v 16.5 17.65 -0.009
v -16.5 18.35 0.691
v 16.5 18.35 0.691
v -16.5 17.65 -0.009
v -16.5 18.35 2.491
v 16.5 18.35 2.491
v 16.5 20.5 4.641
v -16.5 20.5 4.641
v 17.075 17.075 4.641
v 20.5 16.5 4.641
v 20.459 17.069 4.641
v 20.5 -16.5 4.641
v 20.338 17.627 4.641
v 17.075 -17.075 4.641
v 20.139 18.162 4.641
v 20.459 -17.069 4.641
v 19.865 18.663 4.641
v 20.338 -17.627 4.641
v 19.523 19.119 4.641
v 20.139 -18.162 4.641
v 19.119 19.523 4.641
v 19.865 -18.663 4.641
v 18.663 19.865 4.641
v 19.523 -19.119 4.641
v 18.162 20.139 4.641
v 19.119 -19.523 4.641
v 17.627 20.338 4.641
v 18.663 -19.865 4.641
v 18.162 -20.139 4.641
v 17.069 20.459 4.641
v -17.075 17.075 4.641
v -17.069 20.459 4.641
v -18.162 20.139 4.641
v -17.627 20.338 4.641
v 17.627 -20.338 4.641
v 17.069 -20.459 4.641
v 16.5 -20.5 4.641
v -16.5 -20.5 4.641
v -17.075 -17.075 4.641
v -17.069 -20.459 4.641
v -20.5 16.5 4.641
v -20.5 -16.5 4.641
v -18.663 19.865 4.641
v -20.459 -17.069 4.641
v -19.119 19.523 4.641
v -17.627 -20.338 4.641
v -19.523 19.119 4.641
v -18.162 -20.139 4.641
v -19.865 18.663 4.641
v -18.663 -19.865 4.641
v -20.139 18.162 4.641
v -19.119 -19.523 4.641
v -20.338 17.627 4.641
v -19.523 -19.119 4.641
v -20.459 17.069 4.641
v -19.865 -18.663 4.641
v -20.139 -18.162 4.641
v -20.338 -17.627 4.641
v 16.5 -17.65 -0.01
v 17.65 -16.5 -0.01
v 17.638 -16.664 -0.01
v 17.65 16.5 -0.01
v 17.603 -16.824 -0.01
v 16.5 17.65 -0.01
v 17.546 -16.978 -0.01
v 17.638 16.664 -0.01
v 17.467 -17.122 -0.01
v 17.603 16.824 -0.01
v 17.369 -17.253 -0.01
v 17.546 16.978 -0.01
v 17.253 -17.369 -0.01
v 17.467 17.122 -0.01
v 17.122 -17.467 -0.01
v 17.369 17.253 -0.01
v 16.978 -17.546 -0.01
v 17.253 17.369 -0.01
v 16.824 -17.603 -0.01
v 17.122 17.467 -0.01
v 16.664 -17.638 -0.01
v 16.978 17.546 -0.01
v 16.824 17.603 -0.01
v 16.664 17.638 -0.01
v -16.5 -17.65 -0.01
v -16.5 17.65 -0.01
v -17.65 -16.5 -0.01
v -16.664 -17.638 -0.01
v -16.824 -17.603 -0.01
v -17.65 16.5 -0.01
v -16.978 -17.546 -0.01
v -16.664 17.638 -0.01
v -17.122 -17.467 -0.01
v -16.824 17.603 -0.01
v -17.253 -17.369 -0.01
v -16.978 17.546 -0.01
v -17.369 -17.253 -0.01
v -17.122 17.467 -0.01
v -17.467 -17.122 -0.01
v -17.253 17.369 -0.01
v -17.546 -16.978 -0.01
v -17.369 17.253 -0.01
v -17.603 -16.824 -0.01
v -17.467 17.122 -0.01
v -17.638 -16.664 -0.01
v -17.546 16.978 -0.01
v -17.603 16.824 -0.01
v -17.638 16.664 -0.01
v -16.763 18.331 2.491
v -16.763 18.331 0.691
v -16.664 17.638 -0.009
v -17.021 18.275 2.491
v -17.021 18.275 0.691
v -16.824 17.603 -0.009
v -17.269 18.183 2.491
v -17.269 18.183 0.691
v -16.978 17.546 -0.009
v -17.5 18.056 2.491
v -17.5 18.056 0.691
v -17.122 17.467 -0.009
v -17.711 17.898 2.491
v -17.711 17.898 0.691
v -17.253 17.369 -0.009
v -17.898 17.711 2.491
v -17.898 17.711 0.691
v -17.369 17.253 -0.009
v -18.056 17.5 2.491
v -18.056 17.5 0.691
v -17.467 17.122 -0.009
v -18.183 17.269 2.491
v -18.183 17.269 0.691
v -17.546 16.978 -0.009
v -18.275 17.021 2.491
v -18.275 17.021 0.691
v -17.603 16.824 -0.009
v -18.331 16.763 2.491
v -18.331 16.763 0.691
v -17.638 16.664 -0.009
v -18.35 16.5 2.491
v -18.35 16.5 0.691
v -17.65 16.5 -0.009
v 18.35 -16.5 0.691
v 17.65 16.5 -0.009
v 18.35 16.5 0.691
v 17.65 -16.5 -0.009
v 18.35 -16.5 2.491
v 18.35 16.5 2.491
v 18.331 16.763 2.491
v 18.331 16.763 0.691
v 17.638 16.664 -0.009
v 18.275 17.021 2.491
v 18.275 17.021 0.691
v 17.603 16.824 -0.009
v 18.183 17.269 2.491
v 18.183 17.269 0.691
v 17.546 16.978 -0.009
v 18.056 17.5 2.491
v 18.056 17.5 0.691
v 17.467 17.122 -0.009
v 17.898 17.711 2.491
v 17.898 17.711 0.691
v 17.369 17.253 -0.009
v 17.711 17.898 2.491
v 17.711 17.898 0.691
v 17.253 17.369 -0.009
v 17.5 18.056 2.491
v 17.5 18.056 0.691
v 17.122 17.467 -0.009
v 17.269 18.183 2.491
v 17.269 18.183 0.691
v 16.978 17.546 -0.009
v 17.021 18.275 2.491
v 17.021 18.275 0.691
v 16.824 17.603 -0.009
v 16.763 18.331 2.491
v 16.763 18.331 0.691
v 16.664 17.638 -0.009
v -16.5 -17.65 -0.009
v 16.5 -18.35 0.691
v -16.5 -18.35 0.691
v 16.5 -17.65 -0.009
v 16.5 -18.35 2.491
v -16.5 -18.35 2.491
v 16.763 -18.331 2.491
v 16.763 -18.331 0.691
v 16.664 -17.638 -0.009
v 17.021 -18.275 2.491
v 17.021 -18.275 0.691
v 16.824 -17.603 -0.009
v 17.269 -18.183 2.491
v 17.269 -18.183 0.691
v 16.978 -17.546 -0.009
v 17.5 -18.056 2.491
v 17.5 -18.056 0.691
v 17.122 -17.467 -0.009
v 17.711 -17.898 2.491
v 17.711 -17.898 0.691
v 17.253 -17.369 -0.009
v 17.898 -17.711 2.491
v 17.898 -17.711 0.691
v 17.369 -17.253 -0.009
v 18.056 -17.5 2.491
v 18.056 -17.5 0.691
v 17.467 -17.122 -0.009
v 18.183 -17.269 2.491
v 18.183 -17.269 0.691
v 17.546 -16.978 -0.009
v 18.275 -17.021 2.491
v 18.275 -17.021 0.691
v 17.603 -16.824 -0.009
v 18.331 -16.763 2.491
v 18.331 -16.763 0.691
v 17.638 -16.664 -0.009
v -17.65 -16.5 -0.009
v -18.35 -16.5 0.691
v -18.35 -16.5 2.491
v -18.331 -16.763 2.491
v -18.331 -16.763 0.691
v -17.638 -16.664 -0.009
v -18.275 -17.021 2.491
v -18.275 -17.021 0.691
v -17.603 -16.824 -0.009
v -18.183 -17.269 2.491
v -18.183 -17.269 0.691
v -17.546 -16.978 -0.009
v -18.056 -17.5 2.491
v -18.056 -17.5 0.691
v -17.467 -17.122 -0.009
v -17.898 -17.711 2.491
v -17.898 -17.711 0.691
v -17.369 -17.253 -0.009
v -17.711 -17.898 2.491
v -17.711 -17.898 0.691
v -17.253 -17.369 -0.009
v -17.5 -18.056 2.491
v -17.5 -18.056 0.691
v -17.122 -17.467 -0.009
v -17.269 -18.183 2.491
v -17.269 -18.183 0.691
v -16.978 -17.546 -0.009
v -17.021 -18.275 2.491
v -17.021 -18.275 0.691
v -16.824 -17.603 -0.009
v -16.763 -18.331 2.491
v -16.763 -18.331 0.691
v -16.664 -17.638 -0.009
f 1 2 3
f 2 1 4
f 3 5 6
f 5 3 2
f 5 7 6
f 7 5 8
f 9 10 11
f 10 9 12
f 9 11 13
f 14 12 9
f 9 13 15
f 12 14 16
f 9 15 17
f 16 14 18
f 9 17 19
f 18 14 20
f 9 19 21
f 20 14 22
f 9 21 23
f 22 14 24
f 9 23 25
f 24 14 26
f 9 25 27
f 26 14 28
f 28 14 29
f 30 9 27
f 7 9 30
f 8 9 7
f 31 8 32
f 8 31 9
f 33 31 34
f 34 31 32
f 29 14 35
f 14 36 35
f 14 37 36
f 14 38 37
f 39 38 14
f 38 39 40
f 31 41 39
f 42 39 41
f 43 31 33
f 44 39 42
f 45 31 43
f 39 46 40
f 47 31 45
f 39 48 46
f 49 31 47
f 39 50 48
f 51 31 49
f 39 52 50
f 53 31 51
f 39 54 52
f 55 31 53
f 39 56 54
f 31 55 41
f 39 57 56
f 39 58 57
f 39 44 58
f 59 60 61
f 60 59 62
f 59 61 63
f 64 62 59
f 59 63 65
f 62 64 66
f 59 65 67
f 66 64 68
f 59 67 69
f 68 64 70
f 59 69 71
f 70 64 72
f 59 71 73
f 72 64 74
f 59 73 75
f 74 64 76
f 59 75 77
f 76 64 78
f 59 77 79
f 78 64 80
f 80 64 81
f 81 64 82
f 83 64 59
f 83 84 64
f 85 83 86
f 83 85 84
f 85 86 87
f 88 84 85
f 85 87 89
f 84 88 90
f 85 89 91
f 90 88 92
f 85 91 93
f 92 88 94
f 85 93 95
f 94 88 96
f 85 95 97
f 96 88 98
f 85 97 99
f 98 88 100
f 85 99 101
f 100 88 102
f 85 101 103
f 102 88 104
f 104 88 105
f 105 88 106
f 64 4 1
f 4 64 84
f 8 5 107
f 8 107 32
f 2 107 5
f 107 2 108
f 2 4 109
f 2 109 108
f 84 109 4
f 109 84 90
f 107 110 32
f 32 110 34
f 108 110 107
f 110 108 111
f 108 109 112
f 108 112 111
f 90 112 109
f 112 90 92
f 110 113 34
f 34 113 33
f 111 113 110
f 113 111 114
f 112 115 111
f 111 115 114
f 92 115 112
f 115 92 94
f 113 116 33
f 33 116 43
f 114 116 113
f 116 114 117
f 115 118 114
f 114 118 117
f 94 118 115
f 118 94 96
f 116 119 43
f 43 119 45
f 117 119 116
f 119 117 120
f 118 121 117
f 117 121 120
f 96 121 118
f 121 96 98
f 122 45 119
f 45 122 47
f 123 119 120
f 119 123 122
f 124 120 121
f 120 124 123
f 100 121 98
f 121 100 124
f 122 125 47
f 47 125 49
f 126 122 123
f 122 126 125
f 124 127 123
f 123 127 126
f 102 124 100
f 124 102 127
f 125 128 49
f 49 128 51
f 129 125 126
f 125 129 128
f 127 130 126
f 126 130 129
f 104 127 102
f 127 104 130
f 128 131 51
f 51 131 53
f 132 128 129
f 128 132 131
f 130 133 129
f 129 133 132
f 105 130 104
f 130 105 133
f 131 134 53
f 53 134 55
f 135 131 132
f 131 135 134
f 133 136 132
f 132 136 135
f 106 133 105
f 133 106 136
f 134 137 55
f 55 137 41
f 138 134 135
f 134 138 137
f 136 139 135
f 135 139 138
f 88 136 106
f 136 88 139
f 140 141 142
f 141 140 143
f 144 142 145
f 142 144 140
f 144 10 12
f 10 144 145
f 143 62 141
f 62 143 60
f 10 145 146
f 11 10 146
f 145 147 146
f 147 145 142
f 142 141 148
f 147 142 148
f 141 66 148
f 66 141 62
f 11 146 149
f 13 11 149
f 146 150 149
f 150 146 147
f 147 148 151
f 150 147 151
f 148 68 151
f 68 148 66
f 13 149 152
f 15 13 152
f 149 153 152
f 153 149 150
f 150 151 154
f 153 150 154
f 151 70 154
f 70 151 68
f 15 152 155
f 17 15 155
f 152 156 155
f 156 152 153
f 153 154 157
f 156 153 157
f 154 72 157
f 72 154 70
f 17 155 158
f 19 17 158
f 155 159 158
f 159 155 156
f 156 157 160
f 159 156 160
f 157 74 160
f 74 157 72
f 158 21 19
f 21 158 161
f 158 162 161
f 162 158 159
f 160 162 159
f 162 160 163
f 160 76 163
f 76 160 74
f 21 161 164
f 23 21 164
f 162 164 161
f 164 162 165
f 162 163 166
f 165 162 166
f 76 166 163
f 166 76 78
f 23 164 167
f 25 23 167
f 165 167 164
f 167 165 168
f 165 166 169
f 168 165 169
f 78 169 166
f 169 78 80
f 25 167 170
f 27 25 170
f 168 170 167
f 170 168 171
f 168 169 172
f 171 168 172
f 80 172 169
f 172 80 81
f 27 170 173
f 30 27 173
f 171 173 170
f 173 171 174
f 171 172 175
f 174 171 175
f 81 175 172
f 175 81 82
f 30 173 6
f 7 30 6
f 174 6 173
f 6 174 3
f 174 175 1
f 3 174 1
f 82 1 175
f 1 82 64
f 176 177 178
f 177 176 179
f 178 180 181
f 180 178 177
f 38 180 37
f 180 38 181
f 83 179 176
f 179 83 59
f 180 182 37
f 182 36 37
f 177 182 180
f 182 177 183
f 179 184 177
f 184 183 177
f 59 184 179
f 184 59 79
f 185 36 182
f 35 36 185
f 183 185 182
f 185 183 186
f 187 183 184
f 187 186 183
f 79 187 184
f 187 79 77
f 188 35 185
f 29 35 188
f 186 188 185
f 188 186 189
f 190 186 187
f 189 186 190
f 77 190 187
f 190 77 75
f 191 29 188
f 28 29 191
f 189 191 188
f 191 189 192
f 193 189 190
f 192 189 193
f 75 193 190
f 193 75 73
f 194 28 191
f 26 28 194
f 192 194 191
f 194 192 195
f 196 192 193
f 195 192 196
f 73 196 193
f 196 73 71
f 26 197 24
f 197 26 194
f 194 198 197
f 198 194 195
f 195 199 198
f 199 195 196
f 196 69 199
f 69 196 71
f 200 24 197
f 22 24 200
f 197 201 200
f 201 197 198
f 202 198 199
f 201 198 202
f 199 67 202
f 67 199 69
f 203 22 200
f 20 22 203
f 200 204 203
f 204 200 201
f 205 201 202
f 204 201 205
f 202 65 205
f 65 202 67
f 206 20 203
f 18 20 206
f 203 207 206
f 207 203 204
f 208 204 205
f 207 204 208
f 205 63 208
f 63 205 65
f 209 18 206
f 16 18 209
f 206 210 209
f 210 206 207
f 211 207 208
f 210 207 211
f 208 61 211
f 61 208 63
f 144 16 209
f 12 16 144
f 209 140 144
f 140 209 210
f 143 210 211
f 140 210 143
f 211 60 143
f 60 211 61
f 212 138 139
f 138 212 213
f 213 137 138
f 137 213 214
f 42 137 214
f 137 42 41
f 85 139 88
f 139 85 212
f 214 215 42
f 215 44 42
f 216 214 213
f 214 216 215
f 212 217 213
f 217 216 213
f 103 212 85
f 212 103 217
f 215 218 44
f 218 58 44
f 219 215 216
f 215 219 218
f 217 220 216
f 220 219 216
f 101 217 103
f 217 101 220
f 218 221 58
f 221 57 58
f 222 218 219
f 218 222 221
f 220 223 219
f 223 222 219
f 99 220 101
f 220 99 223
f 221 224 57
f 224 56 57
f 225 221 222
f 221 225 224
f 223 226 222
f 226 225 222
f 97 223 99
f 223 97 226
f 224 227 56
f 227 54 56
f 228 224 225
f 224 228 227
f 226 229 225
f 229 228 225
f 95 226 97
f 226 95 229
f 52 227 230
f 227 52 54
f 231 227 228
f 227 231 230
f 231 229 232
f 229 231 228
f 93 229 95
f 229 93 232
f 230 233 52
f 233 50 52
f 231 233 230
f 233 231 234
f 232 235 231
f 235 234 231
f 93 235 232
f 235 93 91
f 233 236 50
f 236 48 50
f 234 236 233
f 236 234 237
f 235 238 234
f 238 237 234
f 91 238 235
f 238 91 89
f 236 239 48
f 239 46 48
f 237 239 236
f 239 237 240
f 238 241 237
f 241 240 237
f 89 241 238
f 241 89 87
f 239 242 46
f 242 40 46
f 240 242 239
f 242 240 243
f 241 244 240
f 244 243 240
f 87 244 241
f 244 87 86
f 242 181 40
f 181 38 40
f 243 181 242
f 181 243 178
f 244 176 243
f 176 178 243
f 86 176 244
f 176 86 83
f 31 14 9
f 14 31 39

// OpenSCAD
module gridfinity_base_tile_raw(distancex=0, distancey=0, fitx=0, fity=0) {
    $fa = 8;
    $fs = 0.25;
    clearance = 1;
    grid_pitch = 42;
    tile_size = grid_pitch - clearance;
    outer_diameter = 8;
    inner_span = tile_size - outer_diameter;
    fill_cube_size = 35.15 - clearance;

    function _rx(a) = [
        [1, 0, 0, 0],
        [0, cos(a), -sin(a), 0],
        [0, sin(a), cos(a), 0],
        [0, 0, 0, 1]
    ];

    function _ry(a) = [
        [cos(a), 0, sin(a), 0],
        [0, 1, 0, 0],
        [-sin(a), 0, cos(a), 0],
        [0, 0, 0, 1]
    ];

    function _rz(a) = [
        [cos(a), -sin(a), 0, 0],
        [sin(a), cos(a), 0, 0],
        [0, 0, 1, 0],
        [0, 0, 0, 1]
    ];

    module sweep_rounded_square_34(size = inner_span) {
        half_size = size / 2;
        path_points = [
            [-half_size, half_size],
            [half_size, half_size],
            [half_size, -half_size],
            [-half_size, -half_size],
            [-half_size, half_size]
        ];

        path_vectors = [
            path_points[1] - path_points[0],
            path_points[2] - path_points[1],
            path_points[3] - path_points[2],
            path_points[4] - path_points[3]
        ];

        first_translation = [
            [1, 0, 0, path_points[0].y],
            [0, 1, 0, 0],
            [0, 0, 1, path_points[0].x],
            [0, 0, 0, 1]
        ];

        affine_translations = concat([first_translation], [
            for (
                i = 0, a = first_translation;
                i < len(path_vectors);
                a = a * [
                    [1, 0, 0, path_vectors[i].y],
                    [0, 1, 0, 0],
                    [0, 0, 1, path_vectors[i].x],
                    [0, 0, 0, 1]
                ],
                i = i + 1
            )
            a * [
                [1, 0, 0, path_vectors[i].y],
                [0, 1, 0, 0],
                [0, 0, 1, path_vectors[i].x],
                [0, 0, 0, 1]
            ]
        ]);

        base_rotation = _rz(90) * _ry(0) * _rx(90);

        walls = [
            for (i = [0 : 3])
            base_rotation * affine_translations[i]
            * (_rz(0) * _ry(atan2(path_vectors[i].y, path_vectors[i].x)) * _rx(0))
        ];

        union() {
            for (i = [0 : 3]) {
                multmatrix(walls[i])
                linear_extrude(size)
                children();

                multmatrix(walls[i] * (_rz(0) * _ry(0) * _rx(-90)))
                rotate_extrude(angle = 90, convexity = 4)
                children();
            }
        }
    }

    grid_size = [1, 1];

    grid_size_mm = [grid_size.x * tile_size, grid_size.y * tile_size, 4.631];
    size_mm = [
        max(grid_size_mm.x, distancex),
        max(grid_size_mm.y, distancey),
        4.631
    ];
    padding_mm = size_mm - grid_size_mm;
    fit_percent_positive = [(fitx + 1) / 2, (fity + 1) / 2];

    padding_start_point = -grid_size_mm / 2 - [
        padding_mm.x * (1 - fit_percent_positive.x),
        padding_mm.y * (1 - fit_percent_positive.y),
        -grid_size_mm.z / 2
    ];

    echo(str("Number of Grids per axes (X, Y)]: ", grid_size));
    echo(str("Final size (in mm): ", size_mm));

    if (padding_mm != [0, 0, 0]) {
        echo(str("Padding +X (in mm): ", padding_mm.x * fit_percent_positive.x));
        echo(str("Padding -X (in mm): ", padding_mm.x * (1 - fit_percent_positive.x)));
        echo(str("Padding +Y (in mm): ", padding_mm.y * fit_percent_positive.y));
        echo(str("Padding -Y (in mm): ", padding_mm.y * (1 - fit_percent_positive.y)));
    }

    translate(padding_start_point)
    for (x = [0 : grid_size.x - 1]) {
        for (y = [0 : grid_size.y - 1]) {
            translate([(x + 0.5) * tile_size, (y + 0.5) * tile_size, -0.01])
            union() {
                sweep_rounded_square_34() {
                    polygon([
                        [1.15, 0.001],
                        [1.85, 0.701],
                        [1.85, 2.501],
                        [4.00, 4.651],
                        [0, 4.651],
                        [0, 0],
                        [1.15, 0]
                    ]);
                }

                translate([0, 0, 4.651 / 2])
                cube([fill_cube_size, fill_cube_size, 4.651], center = true);
            }
        }
    }
}

gridfinity_base_tile_raw();
